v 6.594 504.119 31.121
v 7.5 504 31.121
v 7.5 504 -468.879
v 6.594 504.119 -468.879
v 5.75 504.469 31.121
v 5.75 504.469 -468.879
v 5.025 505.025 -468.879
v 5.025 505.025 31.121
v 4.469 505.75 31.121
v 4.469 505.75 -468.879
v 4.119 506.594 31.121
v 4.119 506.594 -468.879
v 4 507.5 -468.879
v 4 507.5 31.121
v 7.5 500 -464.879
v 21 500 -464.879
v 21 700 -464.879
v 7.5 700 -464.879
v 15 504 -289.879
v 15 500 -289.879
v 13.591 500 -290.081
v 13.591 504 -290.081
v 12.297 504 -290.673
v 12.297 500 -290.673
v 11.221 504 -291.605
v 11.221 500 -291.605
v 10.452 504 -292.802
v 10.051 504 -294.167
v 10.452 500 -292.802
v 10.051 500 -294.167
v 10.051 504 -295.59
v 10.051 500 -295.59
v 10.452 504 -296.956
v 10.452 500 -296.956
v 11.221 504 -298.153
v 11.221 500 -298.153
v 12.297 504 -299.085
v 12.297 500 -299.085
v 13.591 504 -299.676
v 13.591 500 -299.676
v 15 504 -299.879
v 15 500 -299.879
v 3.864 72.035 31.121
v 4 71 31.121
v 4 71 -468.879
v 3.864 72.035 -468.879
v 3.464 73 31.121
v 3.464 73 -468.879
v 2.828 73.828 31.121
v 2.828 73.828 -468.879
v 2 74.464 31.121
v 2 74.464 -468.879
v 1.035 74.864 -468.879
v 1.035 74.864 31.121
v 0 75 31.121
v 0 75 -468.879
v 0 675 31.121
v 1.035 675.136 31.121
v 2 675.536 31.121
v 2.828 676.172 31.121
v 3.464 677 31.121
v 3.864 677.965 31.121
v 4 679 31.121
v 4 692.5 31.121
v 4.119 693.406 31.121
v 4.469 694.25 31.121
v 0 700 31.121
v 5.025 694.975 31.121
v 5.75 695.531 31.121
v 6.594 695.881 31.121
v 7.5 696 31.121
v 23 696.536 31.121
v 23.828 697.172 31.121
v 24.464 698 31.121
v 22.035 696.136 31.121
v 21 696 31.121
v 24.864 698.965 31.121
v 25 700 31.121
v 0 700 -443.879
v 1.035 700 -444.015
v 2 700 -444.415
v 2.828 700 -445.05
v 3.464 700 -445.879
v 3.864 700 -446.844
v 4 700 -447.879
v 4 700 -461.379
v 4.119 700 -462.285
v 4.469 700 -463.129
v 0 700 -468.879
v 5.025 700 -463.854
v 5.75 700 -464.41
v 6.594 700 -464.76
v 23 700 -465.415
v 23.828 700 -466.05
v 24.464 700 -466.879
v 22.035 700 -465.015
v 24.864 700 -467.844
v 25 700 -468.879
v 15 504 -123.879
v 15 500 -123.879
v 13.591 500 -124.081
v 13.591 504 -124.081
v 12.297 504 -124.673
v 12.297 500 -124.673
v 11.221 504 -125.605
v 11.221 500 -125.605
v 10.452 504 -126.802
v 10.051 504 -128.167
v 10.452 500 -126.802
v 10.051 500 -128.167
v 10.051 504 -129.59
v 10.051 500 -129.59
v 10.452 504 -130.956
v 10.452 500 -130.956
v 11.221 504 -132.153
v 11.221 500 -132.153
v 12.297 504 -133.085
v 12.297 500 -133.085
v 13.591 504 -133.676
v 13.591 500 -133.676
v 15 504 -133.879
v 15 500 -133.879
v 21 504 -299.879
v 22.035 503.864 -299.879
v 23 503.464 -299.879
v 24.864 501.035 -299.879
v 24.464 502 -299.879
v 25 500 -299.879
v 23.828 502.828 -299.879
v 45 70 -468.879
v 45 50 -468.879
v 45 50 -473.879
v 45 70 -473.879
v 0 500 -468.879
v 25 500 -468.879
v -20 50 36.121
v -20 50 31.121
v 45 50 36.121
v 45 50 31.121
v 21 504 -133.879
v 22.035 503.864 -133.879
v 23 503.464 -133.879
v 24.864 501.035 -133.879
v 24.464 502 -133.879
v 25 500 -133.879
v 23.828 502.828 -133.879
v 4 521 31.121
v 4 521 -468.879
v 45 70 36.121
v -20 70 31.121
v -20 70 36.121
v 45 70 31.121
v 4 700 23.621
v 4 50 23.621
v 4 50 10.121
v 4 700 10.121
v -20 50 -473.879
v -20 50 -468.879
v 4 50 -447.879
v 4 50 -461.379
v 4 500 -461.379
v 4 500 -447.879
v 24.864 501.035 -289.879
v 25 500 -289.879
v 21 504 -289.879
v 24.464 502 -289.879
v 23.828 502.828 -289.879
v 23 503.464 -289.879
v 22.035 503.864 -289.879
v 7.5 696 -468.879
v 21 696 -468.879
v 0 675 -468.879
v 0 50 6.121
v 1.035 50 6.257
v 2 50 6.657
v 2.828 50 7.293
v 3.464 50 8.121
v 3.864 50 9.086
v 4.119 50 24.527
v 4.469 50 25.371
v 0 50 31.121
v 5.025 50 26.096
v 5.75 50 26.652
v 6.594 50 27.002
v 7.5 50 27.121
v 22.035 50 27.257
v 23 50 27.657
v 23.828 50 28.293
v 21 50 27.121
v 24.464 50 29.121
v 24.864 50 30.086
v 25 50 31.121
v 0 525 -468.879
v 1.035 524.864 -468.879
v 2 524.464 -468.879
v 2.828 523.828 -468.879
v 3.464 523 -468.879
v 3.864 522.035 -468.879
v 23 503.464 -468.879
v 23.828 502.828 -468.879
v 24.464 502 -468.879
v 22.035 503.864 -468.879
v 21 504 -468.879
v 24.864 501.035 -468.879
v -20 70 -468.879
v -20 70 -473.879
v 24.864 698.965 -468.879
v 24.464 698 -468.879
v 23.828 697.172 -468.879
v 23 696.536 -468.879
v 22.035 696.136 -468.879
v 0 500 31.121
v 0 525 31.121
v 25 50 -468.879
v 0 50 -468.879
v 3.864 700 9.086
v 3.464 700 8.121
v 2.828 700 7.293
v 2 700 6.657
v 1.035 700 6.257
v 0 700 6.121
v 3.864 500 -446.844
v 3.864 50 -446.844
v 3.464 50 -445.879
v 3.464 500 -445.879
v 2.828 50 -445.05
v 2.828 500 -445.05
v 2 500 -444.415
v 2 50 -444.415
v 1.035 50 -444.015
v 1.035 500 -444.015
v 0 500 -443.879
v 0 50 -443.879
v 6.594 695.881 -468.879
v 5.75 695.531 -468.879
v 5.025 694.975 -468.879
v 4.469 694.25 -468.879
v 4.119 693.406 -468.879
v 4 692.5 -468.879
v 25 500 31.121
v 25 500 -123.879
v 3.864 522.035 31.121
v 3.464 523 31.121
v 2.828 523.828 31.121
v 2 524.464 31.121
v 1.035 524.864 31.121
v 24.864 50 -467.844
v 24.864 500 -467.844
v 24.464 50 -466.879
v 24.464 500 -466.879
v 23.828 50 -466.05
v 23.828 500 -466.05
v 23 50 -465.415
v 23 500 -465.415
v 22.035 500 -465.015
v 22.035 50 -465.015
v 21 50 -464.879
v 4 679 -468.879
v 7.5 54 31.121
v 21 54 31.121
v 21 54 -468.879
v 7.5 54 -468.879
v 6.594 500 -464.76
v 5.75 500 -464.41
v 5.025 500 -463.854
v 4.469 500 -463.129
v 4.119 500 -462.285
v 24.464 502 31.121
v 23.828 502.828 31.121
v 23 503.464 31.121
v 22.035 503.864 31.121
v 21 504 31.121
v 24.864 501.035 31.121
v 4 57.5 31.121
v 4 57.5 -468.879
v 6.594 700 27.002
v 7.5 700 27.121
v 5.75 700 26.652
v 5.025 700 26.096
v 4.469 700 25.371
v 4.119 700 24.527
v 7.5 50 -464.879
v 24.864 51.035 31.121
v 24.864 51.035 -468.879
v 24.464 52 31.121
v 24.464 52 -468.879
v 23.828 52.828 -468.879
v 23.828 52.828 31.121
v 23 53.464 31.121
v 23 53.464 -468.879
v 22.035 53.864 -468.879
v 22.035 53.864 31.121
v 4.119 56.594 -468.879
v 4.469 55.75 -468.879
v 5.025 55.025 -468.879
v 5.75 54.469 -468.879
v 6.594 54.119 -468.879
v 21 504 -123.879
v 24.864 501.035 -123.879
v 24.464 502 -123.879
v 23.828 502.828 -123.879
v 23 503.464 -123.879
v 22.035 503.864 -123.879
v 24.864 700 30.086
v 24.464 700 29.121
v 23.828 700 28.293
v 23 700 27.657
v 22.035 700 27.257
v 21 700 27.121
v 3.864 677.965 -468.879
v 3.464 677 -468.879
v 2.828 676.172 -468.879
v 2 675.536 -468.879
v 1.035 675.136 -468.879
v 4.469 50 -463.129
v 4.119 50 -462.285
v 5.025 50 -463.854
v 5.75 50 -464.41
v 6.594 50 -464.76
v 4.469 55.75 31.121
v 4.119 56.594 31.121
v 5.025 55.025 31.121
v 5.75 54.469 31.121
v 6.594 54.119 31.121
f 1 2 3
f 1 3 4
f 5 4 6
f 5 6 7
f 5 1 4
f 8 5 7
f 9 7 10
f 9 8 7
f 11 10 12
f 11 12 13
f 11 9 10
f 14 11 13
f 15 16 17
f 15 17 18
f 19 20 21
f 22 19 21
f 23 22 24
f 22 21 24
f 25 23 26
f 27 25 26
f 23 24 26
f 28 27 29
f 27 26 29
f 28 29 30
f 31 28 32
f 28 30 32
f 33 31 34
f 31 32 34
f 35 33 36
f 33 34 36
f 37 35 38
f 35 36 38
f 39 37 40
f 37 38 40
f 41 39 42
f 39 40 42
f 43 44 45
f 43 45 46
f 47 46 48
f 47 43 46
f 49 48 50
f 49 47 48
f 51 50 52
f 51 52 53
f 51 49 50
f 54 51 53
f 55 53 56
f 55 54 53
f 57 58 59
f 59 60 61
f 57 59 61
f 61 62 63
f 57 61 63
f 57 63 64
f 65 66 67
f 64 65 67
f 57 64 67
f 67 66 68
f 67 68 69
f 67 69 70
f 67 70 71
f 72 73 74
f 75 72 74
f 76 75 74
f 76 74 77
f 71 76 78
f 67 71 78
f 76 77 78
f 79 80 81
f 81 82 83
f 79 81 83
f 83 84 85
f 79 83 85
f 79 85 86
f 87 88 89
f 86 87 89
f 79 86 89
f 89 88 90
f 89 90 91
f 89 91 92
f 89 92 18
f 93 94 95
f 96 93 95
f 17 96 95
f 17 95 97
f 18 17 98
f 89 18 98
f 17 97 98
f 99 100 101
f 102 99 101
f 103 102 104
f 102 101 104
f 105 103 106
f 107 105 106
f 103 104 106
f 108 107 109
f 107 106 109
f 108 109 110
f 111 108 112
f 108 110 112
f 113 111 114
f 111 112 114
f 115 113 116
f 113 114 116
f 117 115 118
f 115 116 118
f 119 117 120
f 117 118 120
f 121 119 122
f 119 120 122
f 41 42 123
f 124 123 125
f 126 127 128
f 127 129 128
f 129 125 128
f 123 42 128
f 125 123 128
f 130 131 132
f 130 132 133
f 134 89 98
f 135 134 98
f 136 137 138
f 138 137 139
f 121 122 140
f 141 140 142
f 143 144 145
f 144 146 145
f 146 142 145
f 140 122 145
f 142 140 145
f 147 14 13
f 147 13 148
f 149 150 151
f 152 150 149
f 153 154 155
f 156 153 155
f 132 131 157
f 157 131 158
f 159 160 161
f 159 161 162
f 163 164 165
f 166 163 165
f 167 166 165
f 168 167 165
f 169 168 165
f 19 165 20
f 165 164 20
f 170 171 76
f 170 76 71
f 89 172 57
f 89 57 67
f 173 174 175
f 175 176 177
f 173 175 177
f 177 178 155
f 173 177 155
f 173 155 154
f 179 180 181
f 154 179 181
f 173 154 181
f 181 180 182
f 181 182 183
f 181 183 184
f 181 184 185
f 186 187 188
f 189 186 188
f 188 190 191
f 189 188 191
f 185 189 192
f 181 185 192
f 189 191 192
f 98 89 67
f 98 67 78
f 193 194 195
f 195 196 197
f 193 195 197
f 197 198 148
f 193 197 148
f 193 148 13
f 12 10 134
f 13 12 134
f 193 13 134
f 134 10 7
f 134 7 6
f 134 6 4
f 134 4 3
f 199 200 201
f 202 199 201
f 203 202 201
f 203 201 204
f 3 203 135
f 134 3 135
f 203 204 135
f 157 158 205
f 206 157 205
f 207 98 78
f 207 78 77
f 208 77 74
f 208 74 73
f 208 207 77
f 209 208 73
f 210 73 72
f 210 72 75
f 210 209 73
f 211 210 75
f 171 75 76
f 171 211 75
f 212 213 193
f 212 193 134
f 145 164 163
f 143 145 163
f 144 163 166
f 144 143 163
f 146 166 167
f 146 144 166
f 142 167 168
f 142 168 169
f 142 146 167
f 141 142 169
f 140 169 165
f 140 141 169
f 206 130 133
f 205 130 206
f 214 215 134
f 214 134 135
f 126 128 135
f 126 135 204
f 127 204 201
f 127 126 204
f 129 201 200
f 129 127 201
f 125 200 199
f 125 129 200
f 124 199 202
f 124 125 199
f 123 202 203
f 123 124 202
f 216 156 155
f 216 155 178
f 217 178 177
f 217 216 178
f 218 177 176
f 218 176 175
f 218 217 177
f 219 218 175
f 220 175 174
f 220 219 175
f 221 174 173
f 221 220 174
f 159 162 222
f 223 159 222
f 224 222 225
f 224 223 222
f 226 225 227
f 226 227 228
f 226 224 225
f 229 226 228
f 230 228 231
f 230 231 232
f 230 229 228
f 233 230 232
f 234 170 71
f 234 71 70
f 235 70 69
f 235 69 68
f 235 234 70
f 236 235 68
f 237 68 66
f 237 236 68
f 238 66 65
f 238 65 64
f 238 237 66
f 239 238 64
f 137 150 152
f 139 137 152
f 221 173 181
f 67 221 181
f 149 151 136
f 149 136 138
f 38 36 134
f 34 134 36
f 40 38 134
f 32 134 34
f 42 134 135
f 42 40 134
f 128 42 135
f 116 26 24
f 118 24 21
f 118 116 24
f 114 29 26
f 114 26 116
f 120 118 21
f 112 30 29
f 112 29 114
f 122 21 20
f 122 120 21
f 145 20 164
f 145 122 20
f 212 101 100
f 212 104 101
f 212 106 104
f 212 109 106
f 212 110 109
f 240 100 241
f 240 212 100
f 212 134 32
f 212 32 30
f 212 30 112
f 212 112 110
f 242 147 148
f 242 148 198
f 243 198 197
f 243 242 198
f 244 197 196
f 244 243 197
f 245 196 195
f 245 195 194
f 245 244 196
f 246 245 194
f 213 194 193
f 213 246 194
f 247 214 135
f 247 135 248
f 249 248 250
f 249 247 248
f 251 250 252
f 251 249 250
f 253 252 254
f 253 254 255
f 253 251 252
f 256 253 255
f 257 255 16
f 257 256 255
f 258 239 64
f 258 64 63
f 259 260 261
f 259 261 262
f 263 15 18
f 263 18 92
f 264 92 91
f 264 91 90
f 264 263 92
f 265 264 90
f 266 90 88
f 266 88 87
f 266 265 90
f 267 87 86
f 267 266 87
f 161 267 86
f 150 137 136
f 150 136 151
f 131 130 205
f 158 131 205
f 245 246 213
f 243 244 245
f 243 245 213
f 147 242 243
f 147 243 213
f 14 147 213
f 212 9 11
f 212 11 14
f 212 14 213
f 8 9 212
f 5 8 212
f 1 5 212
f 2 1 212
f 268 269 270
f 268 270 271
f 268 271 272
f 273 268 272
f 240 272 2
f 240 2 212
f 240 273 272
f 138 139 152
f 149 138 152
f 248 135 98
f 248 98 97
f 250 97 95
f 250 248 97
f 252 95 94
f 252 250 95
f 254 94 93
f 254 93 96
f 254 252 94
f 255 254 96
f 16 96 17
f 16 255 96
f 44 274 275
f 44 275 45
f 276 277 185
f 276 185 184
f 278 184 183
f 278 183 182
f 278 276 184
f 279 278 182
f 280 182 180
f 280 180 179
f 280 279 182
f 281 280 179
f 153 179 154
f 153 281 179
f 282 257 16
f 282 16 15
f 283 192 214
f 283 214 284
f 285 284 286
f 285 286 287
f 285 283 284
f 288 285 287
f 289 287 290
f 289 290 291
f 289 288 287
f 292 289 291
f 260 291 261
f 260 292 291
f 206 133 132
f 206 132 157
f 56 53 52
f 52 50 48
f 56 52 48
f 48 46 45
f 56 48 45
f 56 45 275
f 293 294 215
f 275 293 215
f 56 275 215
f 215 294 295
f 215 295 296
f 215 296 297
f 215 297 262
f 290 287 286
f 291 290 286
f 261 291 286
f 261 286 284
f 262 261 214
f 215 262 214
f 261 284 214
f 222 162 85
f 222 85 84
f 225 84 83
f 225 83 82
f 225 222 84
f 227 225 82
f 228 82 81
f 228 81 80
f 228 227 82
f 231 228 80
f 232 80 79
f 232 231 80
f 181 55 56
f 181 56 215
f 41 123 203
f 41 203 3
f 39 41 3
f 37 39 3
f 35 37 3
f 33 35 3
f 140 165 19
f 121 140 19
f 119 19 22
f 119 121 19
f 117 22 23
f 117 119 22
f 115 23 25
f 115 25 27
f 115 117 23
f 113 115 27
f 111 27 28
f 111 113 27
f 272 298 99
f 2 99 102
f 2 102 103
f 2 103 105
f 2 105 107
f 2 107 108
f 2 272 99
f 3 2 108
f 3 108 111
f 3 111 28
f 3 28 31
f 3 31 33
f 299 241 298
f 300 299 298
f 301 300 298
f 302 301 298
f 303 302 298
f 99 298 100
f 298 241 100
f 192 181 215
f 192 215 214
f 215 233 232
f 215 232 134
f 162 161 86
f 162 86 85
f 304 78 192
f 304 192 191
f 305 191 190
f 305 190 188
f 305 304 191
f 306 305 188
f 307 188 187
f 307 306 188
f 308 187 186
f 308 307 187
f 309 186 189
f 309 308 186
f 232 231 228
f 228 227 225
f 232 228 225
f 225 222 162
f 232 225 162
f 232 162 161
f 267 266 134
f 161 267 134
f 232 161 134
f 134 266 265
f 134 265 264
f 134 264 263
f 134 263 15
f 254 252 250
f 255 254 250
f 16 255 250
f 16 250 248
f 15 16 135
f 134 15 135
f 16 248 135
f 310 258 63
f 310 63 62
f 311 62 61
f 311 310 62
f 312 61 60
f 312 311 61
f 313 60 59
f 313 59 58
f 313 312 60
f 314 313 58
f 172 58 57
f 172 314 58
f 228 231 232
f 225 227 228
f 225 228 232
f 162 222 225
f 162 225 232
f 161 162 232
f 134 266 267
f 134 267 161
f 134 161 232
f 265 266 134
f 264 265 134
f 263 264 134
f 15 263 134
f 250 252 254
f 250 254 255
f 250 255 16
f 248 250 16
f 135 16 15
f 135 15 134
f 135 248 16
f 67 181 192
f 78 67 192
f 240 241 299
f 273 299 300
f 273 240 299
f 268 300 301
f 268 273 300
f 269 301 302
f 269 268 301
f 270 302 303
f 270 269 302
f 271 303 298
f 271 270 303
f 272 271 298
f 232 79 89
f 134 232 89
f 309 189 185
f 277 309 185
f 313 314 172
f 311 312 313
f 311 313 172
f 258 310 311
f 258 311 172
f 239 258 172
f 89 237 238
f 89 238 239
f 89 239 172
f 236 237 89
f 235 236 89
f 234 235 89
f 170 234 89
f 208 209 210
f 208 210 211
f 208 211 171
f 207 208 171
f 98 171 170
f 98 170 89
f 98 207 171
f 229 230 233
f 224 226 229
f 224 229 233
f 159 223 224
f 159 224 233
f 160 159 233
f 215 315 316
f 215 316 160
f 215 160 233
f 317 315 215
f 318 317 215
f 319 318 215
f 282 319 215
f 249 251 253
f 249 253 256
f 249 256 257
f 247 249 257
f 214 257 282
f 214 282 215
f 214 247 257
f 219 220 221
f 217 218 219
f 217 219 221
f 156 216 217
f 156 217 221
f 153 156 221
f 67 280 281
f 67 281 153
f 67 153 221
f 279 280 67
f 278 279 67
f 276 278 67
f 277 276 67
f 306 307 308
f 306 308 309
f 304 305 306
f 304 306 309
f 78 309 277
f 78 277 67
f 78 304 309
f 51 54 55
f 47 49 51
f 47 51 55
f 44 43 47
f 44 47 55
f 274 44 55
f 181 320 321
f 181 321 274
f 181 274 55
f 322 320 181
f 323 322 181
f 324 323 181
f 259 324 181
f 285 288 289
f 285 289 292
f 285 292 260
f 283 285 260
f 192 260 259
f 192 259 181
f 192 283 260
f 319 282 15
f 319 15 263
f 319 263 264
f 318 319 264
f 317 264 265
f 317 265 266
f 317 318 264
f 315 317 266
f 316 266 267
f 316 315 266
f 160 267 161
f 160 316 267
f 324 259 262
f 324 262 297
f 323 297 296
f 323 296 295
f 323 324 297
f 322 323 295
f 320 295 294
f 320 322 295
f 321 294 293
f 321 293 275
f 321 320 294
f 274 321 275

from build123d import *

# Parameters (mm, degrees)
STRUCTURAL_MEMBER4_DEPTH  = 500
STRUCTURAL_MEMBER5_DEPTH  = 500
CUT_EXTRUDE3_DEPTH        = 5
LPATTERN2_COUNT           = 2
LPATTERN2_PITCH           = 166
STRUCTURAL_MEMBER7_DEPTH  = 500
STRUCTURAL_MEMBER8_DEPTH  = 650
STRUCTURAL_MEMBER9_DEPTH  = 450
STRUCTURAL_MEMBER10_DEPTH = 200
SKETCH114_W               = 65
SKETCH114_H               = 20
BOSS_EXTRUDE6_DEPTH       = 5
SKETCH115_W               = 65
SKETCH115_H               = 20
BOSS_EXTRUDE7_DEPTH       = 5


with BuildPart() as part:
    # Sketch14 → Structural Member4 (new body)
    with BuildSketch(Plane(origin=(0, 700, -468.878865899), x_dir=(0, -1, 0), z_dir=(0, 0, 1))):
        with BuildLine():
            Line((0, 0), (0, 25))
            ThreePointArc((0, 25), (2.828427125, 23.828427125), (4, 21))
            Line((4, 21), (4, 7.5))
            ThreePointArc((4, 7.5), (5.025126266, 5.025126266), (7.5, 4))
            Line((7.5, 4), (21, 4))
            ThreePointArc((21, 4), (23.828427125, 2.828427125), (25, 0))
            Line((25, 0), (0, 0))
        make_face()
    extrude(amount=STRUCTURAL_MEMBER4_DEPTH)


with BuildPart() as body_2:
    # Sketch15 → Structural Member5 (new body)
    with BuildSketch(Plane(origin=(0, 500, 31.121134101), x_dir=(0, 1, 0), z_dir=(0, 0, -1))):
        with BuildLine():
            Line((0, 0), (0, 25))
            ThreePointArc((0, 25), (2.828427125, 23.828427125), (4, 21))
            Line((4, 21), (4, 7.5))
            ThreePointArc((4, 7.5), (5.025126266, 5.025126266), (7.5, 4))
            Line((7.5, 4), (21, 4))
            ThreePointArc((21, 4), (23.828427125, 2.828427125), (25, 0))
            Line((25, 0), (0, 0))
        make_face()
    extrude(amount=STRUCTURAL_MEMBER5_DEPTH)

    # Sketch23 → Cut-Extrude3 (cut)
    with BuildSketch(Plane(origin=(0, 500, 0), x_dir=(-1, 0, 0), z_dir=(0, -1, 0))):
        with BuildLine():
            Line((-25, 123.878865899), (-15, 123.878865899))
            ThreePointArc((-15, 123.878865899), (-10, 128.878865899), (-15, 133.878865899))
            Line((-15, 133.878865899), (-25, 133.878865899))
            Line((-25, 133.878865899), (-25, 123.878865899))
        make_face()
    cut_extrude3 = extrude(amount=-CUT_EXTRUDE3_DEPTH, mode=Mode.SUBTRACT)

    # LPattern2: Cut-Extrude3 ×2
    with Locations(*[(0, 0, -i * LPATTERN2_PITCH) for i in range(1, LPATTERN2_COUNT)]):
        add(cut_extrude3, mode=Mode.SUBTRACT)


with BuildPart() as body_3:
    # Sketch110 → Structural Member7 (new body)
    with BuildSketch(Plane(origin=(0, 50, 31.121134101), x_dir=(0, 1, 0), z_dir=(0, 0, -1))):
        with BuildLine():
            Line((0, 0), (0, 25))
            ThreePointArc((0, 25), (2.828427125, 23.828427125), (4, 21))
            Line((4, 21), (4, 7.5))
            ThreePointArc((4, 7.5), (5.025126266, 5.025126266), (7.5, 4))
            Line((7.5, 4), (21, 4))
            ThreePointArc((21, 4), (23.828427125, 2.828427125), (25, 0))
            Line((25, 0), (0, 0))
        make_face()
    extrude(amount=STRUCTURAL_MEMBER7_DEPTH)


with BuildPart() as body_4:
    # Sketch111 → Structural Member8 (new body)
    with BuildSketch(Plane(origin=(0, 700, 31.121134101), x_dir=(0, 0, -1), z_dir=(0, -1, 0))):
        with BuildLine():
            Line((0, 0), (0, 25))
            ThreePointArc((0, 25), (2.828427125, 23.828427125), (4, 21))
            Line((4, 21), (4, 7.5))
            ThreePointArc((4, 7.5), (5.025126266, 5.025126266), (7.5, 4))
            Line((7.5, 4), (21, 4))
            ThreePointArc((21, 4), (23.828427125, 2.828427125), (25, 0))
            Line((25, 0), (0, 0))
        make_face()
    extrude(amount=STRUCTURAL_MEMBER8_DEPTH)


with BuildPart() as body_5:
    # Sketch112 → Structural Member9 (new body)
    with BuildSketch(Plane(origin=(0, 50, -468.878865899), x_dir=(0, 0, 1), z_dir=(0, 1, 0))):
        with BuildLine():
            Line((0, 0), (0, 25))
            ThreePointArc((0, 25), (2.828427125, 23.828427125), (4, 21))
            Line((4, 21), (4, 7.5))
            ThreePointArc((4, 7.5), (5.025126266, 5.025126266), (7.5, 4))
            Line((7.5, 4), (21, 4))
            ThreePointArc((21, 4), (23.828427125, 2.828427125), (25, 0))
            Line((25, 0), (0, 0))
        make_face()
    extrude(amount=STRUCTURAL_MEMBER9_DEPTH)


with BuildPart() as body_6:
    # Sketch113 → Structural Member10 (new body)
    with BuildSketch(Plane(origin=(0, 500, -468.878865899), x_dir=(0, 0, 1), z_dir=(0, 1, 0))):
        with BuildLine():
            Line((0, 0), (0, 25))
            ThreePointArc((0, 25), (2.828427125, 23.828427125), (4, 21))
            Line((4, 21), (4, 7.5))
            ThreePointArc((4, 7.5), (5.025126266, 5.025126266), (7.5, 4))
            Line((7.5, 4), (21, 4))
            ThreePointArc((21, 4), (23.828427125, 2.828427125), (25, 0))
            Line((25, 0), (0, 0))
        make_face()
    extrude(amount=STRUCTURAL_MEMBER10_DEPTH)


with BuildPart() as body_7:
    # Sketch114 → Boss-Extrude6 (new body)
    with BuildSketch(Plane.XY.offset(31.121134101)):
        with Locations((12.5, 60)):
            Rectangle(SKETCH114_W, SKETCH114_H)
    extrude(amount=BOSS_EXTRUDE6_DEPTH)


with BuildPart() as body_8:
    # Sketch115 → Boss-Extrude7 (new body)
    with BuildSketch(Plane(origin=(0, 0, -468.878865899), x_dir=(-1, 0, 0), z_dir=(0, 0, -1))):
        with Locations((-12.5, 60)):
            Rectangle(SKETCH115_W, SKETCH115_H)
    extrude(amount=BOSS_EXTRUDE7_DEPTH)


solid = Compound([part.part, body_2.part, body_3.part, body_4.part, body_5.part, body_6.part, body_7.part, body_8.part])
